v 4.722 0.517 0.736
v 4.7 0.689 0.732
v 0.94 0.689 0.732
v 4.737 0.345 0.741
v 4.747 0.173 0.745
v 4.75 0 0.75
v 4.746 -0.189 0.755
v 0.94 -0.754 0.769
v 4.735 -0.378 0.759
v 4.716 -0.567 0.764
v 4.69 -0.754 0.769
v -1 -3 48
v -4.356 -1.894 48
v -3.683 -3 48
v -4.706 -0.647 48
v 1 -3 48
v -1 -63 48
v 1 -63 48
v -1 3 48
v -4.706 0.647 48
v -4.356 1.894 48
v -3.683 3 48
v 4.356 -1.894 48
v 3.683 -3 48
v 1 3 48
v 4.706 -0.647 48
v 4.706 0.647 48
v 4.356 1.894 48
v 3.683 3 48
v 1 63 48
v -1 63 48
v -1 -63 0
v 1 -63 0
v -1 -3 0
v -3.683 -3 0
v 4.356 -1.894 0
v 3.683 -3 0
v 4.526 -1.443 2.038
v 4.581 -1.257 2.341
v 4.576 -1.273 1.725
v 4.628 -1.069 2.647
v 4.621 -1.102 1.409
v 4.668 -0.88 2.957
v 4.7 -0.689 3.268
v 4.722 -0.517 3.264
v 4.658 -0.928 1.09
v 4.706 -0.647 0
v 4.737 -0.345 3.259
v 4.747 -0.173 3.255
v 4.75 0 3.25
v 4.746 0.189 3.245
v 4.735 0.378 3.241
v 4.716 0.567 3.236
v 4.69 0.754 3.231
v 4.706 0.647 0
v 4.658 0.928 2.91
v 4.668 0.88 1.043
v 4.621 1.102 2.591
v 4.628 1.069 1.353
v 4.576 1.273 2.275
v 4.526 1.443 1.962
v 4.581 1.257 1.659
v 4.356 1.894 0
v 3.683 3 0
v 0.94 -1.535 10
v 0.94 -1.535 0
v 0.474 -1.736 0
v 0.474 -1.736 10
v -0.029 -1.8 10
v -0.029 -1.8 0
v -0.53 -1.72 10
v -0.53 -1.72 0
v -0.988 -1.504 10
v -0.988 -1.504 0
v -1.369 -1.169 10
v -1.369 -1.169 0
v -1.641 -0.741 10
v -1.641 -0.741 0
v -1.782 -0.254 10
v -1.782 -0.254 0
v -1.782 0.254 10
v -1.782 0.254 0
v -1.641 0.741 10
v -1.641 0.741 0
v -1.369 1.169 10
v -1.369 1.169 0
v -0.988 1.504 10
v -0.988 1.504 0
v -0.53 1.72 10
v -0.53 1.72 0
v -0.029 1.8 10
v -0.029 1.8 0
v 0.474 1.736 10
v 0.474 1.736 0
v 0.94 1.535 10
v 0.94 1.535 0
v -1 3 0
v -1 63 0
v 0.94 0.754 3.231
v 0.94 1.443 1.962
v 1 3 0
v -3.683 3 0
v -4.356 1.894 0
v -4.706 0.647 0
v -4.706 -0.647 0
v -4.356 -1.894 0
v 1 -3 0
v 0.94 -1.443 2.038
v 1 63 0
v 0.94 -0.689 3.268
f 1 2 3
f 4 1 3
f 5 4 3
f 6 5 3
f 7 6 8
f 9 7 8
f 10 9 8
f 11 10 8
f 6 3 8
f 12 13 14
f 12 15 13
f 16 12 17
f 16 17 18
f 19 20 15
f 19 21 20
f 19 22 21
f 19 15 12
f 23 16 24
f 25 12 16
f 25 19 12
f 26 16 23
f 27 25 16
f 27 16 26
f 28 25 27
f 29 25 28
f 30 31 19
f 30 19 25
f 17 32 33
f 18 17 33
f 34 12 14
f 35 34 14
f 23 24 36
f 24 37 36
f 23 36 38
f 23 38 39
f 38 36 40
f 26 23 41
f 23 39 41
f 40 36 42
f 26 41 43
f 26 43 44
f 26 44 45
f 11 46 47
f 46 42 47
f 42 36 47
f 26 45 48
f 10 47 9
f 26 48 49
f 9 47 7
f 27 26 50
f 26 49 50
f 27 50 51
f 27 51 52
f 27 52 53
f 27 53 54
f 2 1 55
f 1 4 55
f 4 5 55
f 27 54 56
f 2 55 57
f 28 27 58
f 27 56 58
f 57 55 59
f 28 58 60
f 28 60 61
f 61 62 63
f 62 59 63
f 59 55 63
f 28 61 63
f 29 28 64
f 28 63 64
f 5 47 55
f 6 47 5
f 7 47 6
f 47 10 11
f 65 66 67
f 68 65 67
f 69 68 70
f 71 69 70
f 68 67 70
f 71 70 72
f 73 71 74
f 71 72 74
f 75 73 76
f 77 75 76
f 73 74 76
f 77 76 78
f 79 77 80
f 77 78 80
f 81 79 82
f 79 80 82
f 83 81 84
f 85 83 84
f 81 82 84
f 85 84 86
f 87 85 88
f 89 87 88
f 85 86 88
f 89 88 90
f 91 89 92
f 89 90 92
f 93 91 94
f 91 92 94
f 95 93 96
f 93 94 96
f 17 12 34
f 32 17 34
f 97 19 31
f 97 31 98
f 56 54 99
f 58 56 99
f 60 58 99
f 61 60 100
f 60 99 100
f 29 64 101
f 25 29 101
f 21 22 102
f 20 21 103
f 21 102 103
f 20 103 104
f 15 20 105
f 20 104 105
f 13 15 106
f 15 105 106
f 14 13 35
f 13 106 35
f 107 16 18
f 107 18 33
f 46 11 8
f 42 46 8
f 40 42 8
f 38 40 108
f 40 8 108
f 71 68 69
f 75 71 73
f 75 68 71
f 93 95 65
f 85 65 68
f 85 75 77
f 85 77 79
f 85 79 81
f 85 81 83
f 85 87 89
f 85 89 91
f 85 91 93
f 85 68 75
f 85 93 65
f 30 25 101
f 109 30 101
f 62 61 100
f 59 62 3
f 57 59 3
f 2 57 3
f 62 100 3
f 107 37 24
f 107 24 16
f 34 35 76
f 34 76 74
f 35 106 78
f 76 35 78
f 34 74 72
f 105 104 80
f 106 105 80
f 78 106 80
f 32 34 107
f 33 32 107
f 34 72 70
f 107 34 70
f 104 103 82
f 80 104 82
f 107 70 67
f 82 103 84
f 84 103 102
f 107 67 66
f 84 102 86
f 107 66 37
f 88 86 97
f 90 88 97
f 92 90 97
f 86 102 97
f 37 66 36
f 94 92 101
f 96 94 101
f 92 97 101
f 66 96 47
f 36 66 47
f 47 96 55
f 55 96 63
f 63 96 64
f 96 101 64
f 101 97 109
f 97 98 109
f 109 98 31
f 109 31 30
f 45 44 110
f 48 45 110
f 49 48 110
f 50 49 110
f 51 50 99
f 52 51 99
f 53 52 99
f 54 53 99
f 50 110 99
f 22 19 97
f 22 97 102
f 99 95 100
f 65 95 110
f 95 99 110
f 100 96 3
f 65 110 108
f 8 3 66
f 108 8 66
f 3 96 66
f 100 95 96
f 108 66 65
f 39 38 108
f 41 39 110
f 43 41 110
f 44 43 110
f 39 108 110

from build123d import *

# Parameters (mm, degrees)
SKETCH1_R           = 4.75
BOSS_EXTRUDE1_DEPTH = 48
CUT_EXTRUDE1_DEPTH  = 10
CUT_EXTRUDE2_DEPTH  = 49.568905691
CUT_EXTRUDE3_REACH  = 50.468
SKETCH5_W           = 2
SKETCH5_H           = 48
BOSS_EXTRUDE2_DEPTH = 60


with BuildPart() as part:
    # Sketch1 → Boss-Extrude1 (new body)
    with BuildSketch(Plane.XY):
        Circle(SKETCH1_R)
    extrude(amount=BOSS_EXTRUDE1_DEPTH)

    # Sketch2 → Cut-Extrude1 (cut)
    with BuildSketch(Plane(origin=(0, 0, 0), x_dir=(-1, 0, 0), z_dir=(0, 0, -1))):
        with BuildLine():
            Line((-0.94, 1.535057002), (-0.94, -1.535057002))
            ThreePointArc((-0.94, -1.535057002), (1.8, 0), (-0.94, 1.535057002))
        make_face()
    extrude(amount=-CUT_EXTRUDE1_DEPTH, mode=Mode.SUBTRACT)

    # Sketch3 → Cut-Extrude2 (cut, through all)
    with BuildSketch(Plane.ZY.offset(-0.94)):
        Polygon((3.230708553, 0.754115238), (1.962271323, 1.44288249), (0.73156277, 0.688767252), (0.769291447, -0.754115238), (2.037728677, -1.44288249), (3.26843723, -0.688767252), align=None)
    extrude(amount=-CUT_EXTRUDE2_DEPTH, mode=Mode.SUBTRACT)

    # Sketch4 → Cut-Extrude3 (cut, up to next)
    with BuildSketch(Plane(origin=(0, 0, 0), x_dir=(-1, 0, 0), z_dir=(0, 0, -1)), mode=Mode.PRIVATE) as cut_extrude3_sk1:
        with BuildLine():
            Line((-3.682729966, 3), (3.682729966, 3))
            ThreePointArc((3.682729966, 3), (0, 4.75), (-3.682729966, 3))
        make_face()
    cut_extrude3_tool1 = extrude(cut_extrude3_sk1.sketch, amount=-CUT_EXTRUDE3_REACH, mode=Mode.PRIVATE) & part.part
    # Sketch4 → Cut-Extrude3 (cut, up to next)
    with BuildSketch(Plane(origin=(0, 0, 0), x_dir=(-1, 0, 0), z_dir=(0, 0, -1)), mode=Mode.PRIVATE) as cut_extrude3_sk2:
        with BuildLine():
            Line((-3.682729966, -3), (3.682729966, -3))
            ThreePointArc((3.682729966, -3), (0, -4.75), (-3.682729966, -3))
        make_face()
    cut_extrude3_tool2 = extrude(cut_extrude3_sk2.sketch, amount=-CUT_EXTRUDE3_REACH, mode=Mode.PRIVATE) & part.part
    add(cut_extrude3_tool1.solids().sort_by_distance((0, 3.712383, 0))[0], mode=Mode.SUBTRACT)
    add(cut_extrude3_tool2.solids().sort_by_distance((0, -3.712383, 0))[0], mode=Mode.SUBTRACT)

    # Sketch5 → Boss-Extrude2 (add)
    with BuildSketch(Plane(origin=(0, 3, 0), x_dir=(1, 0, 0), z_dir=(0, 1, 0))):
        with Locations((0, -24)):
            Rectangle(SKETCH5_W, SKETCH5_H)
    boss_extrude2 = extrude(amount=BOSS_EXTRUDE2_DEPTH)

    # Mirror2: Boss-Extrude2 across plane
    add(boss_extrude2.mirror(Plane.ZX))


solid = part.part
